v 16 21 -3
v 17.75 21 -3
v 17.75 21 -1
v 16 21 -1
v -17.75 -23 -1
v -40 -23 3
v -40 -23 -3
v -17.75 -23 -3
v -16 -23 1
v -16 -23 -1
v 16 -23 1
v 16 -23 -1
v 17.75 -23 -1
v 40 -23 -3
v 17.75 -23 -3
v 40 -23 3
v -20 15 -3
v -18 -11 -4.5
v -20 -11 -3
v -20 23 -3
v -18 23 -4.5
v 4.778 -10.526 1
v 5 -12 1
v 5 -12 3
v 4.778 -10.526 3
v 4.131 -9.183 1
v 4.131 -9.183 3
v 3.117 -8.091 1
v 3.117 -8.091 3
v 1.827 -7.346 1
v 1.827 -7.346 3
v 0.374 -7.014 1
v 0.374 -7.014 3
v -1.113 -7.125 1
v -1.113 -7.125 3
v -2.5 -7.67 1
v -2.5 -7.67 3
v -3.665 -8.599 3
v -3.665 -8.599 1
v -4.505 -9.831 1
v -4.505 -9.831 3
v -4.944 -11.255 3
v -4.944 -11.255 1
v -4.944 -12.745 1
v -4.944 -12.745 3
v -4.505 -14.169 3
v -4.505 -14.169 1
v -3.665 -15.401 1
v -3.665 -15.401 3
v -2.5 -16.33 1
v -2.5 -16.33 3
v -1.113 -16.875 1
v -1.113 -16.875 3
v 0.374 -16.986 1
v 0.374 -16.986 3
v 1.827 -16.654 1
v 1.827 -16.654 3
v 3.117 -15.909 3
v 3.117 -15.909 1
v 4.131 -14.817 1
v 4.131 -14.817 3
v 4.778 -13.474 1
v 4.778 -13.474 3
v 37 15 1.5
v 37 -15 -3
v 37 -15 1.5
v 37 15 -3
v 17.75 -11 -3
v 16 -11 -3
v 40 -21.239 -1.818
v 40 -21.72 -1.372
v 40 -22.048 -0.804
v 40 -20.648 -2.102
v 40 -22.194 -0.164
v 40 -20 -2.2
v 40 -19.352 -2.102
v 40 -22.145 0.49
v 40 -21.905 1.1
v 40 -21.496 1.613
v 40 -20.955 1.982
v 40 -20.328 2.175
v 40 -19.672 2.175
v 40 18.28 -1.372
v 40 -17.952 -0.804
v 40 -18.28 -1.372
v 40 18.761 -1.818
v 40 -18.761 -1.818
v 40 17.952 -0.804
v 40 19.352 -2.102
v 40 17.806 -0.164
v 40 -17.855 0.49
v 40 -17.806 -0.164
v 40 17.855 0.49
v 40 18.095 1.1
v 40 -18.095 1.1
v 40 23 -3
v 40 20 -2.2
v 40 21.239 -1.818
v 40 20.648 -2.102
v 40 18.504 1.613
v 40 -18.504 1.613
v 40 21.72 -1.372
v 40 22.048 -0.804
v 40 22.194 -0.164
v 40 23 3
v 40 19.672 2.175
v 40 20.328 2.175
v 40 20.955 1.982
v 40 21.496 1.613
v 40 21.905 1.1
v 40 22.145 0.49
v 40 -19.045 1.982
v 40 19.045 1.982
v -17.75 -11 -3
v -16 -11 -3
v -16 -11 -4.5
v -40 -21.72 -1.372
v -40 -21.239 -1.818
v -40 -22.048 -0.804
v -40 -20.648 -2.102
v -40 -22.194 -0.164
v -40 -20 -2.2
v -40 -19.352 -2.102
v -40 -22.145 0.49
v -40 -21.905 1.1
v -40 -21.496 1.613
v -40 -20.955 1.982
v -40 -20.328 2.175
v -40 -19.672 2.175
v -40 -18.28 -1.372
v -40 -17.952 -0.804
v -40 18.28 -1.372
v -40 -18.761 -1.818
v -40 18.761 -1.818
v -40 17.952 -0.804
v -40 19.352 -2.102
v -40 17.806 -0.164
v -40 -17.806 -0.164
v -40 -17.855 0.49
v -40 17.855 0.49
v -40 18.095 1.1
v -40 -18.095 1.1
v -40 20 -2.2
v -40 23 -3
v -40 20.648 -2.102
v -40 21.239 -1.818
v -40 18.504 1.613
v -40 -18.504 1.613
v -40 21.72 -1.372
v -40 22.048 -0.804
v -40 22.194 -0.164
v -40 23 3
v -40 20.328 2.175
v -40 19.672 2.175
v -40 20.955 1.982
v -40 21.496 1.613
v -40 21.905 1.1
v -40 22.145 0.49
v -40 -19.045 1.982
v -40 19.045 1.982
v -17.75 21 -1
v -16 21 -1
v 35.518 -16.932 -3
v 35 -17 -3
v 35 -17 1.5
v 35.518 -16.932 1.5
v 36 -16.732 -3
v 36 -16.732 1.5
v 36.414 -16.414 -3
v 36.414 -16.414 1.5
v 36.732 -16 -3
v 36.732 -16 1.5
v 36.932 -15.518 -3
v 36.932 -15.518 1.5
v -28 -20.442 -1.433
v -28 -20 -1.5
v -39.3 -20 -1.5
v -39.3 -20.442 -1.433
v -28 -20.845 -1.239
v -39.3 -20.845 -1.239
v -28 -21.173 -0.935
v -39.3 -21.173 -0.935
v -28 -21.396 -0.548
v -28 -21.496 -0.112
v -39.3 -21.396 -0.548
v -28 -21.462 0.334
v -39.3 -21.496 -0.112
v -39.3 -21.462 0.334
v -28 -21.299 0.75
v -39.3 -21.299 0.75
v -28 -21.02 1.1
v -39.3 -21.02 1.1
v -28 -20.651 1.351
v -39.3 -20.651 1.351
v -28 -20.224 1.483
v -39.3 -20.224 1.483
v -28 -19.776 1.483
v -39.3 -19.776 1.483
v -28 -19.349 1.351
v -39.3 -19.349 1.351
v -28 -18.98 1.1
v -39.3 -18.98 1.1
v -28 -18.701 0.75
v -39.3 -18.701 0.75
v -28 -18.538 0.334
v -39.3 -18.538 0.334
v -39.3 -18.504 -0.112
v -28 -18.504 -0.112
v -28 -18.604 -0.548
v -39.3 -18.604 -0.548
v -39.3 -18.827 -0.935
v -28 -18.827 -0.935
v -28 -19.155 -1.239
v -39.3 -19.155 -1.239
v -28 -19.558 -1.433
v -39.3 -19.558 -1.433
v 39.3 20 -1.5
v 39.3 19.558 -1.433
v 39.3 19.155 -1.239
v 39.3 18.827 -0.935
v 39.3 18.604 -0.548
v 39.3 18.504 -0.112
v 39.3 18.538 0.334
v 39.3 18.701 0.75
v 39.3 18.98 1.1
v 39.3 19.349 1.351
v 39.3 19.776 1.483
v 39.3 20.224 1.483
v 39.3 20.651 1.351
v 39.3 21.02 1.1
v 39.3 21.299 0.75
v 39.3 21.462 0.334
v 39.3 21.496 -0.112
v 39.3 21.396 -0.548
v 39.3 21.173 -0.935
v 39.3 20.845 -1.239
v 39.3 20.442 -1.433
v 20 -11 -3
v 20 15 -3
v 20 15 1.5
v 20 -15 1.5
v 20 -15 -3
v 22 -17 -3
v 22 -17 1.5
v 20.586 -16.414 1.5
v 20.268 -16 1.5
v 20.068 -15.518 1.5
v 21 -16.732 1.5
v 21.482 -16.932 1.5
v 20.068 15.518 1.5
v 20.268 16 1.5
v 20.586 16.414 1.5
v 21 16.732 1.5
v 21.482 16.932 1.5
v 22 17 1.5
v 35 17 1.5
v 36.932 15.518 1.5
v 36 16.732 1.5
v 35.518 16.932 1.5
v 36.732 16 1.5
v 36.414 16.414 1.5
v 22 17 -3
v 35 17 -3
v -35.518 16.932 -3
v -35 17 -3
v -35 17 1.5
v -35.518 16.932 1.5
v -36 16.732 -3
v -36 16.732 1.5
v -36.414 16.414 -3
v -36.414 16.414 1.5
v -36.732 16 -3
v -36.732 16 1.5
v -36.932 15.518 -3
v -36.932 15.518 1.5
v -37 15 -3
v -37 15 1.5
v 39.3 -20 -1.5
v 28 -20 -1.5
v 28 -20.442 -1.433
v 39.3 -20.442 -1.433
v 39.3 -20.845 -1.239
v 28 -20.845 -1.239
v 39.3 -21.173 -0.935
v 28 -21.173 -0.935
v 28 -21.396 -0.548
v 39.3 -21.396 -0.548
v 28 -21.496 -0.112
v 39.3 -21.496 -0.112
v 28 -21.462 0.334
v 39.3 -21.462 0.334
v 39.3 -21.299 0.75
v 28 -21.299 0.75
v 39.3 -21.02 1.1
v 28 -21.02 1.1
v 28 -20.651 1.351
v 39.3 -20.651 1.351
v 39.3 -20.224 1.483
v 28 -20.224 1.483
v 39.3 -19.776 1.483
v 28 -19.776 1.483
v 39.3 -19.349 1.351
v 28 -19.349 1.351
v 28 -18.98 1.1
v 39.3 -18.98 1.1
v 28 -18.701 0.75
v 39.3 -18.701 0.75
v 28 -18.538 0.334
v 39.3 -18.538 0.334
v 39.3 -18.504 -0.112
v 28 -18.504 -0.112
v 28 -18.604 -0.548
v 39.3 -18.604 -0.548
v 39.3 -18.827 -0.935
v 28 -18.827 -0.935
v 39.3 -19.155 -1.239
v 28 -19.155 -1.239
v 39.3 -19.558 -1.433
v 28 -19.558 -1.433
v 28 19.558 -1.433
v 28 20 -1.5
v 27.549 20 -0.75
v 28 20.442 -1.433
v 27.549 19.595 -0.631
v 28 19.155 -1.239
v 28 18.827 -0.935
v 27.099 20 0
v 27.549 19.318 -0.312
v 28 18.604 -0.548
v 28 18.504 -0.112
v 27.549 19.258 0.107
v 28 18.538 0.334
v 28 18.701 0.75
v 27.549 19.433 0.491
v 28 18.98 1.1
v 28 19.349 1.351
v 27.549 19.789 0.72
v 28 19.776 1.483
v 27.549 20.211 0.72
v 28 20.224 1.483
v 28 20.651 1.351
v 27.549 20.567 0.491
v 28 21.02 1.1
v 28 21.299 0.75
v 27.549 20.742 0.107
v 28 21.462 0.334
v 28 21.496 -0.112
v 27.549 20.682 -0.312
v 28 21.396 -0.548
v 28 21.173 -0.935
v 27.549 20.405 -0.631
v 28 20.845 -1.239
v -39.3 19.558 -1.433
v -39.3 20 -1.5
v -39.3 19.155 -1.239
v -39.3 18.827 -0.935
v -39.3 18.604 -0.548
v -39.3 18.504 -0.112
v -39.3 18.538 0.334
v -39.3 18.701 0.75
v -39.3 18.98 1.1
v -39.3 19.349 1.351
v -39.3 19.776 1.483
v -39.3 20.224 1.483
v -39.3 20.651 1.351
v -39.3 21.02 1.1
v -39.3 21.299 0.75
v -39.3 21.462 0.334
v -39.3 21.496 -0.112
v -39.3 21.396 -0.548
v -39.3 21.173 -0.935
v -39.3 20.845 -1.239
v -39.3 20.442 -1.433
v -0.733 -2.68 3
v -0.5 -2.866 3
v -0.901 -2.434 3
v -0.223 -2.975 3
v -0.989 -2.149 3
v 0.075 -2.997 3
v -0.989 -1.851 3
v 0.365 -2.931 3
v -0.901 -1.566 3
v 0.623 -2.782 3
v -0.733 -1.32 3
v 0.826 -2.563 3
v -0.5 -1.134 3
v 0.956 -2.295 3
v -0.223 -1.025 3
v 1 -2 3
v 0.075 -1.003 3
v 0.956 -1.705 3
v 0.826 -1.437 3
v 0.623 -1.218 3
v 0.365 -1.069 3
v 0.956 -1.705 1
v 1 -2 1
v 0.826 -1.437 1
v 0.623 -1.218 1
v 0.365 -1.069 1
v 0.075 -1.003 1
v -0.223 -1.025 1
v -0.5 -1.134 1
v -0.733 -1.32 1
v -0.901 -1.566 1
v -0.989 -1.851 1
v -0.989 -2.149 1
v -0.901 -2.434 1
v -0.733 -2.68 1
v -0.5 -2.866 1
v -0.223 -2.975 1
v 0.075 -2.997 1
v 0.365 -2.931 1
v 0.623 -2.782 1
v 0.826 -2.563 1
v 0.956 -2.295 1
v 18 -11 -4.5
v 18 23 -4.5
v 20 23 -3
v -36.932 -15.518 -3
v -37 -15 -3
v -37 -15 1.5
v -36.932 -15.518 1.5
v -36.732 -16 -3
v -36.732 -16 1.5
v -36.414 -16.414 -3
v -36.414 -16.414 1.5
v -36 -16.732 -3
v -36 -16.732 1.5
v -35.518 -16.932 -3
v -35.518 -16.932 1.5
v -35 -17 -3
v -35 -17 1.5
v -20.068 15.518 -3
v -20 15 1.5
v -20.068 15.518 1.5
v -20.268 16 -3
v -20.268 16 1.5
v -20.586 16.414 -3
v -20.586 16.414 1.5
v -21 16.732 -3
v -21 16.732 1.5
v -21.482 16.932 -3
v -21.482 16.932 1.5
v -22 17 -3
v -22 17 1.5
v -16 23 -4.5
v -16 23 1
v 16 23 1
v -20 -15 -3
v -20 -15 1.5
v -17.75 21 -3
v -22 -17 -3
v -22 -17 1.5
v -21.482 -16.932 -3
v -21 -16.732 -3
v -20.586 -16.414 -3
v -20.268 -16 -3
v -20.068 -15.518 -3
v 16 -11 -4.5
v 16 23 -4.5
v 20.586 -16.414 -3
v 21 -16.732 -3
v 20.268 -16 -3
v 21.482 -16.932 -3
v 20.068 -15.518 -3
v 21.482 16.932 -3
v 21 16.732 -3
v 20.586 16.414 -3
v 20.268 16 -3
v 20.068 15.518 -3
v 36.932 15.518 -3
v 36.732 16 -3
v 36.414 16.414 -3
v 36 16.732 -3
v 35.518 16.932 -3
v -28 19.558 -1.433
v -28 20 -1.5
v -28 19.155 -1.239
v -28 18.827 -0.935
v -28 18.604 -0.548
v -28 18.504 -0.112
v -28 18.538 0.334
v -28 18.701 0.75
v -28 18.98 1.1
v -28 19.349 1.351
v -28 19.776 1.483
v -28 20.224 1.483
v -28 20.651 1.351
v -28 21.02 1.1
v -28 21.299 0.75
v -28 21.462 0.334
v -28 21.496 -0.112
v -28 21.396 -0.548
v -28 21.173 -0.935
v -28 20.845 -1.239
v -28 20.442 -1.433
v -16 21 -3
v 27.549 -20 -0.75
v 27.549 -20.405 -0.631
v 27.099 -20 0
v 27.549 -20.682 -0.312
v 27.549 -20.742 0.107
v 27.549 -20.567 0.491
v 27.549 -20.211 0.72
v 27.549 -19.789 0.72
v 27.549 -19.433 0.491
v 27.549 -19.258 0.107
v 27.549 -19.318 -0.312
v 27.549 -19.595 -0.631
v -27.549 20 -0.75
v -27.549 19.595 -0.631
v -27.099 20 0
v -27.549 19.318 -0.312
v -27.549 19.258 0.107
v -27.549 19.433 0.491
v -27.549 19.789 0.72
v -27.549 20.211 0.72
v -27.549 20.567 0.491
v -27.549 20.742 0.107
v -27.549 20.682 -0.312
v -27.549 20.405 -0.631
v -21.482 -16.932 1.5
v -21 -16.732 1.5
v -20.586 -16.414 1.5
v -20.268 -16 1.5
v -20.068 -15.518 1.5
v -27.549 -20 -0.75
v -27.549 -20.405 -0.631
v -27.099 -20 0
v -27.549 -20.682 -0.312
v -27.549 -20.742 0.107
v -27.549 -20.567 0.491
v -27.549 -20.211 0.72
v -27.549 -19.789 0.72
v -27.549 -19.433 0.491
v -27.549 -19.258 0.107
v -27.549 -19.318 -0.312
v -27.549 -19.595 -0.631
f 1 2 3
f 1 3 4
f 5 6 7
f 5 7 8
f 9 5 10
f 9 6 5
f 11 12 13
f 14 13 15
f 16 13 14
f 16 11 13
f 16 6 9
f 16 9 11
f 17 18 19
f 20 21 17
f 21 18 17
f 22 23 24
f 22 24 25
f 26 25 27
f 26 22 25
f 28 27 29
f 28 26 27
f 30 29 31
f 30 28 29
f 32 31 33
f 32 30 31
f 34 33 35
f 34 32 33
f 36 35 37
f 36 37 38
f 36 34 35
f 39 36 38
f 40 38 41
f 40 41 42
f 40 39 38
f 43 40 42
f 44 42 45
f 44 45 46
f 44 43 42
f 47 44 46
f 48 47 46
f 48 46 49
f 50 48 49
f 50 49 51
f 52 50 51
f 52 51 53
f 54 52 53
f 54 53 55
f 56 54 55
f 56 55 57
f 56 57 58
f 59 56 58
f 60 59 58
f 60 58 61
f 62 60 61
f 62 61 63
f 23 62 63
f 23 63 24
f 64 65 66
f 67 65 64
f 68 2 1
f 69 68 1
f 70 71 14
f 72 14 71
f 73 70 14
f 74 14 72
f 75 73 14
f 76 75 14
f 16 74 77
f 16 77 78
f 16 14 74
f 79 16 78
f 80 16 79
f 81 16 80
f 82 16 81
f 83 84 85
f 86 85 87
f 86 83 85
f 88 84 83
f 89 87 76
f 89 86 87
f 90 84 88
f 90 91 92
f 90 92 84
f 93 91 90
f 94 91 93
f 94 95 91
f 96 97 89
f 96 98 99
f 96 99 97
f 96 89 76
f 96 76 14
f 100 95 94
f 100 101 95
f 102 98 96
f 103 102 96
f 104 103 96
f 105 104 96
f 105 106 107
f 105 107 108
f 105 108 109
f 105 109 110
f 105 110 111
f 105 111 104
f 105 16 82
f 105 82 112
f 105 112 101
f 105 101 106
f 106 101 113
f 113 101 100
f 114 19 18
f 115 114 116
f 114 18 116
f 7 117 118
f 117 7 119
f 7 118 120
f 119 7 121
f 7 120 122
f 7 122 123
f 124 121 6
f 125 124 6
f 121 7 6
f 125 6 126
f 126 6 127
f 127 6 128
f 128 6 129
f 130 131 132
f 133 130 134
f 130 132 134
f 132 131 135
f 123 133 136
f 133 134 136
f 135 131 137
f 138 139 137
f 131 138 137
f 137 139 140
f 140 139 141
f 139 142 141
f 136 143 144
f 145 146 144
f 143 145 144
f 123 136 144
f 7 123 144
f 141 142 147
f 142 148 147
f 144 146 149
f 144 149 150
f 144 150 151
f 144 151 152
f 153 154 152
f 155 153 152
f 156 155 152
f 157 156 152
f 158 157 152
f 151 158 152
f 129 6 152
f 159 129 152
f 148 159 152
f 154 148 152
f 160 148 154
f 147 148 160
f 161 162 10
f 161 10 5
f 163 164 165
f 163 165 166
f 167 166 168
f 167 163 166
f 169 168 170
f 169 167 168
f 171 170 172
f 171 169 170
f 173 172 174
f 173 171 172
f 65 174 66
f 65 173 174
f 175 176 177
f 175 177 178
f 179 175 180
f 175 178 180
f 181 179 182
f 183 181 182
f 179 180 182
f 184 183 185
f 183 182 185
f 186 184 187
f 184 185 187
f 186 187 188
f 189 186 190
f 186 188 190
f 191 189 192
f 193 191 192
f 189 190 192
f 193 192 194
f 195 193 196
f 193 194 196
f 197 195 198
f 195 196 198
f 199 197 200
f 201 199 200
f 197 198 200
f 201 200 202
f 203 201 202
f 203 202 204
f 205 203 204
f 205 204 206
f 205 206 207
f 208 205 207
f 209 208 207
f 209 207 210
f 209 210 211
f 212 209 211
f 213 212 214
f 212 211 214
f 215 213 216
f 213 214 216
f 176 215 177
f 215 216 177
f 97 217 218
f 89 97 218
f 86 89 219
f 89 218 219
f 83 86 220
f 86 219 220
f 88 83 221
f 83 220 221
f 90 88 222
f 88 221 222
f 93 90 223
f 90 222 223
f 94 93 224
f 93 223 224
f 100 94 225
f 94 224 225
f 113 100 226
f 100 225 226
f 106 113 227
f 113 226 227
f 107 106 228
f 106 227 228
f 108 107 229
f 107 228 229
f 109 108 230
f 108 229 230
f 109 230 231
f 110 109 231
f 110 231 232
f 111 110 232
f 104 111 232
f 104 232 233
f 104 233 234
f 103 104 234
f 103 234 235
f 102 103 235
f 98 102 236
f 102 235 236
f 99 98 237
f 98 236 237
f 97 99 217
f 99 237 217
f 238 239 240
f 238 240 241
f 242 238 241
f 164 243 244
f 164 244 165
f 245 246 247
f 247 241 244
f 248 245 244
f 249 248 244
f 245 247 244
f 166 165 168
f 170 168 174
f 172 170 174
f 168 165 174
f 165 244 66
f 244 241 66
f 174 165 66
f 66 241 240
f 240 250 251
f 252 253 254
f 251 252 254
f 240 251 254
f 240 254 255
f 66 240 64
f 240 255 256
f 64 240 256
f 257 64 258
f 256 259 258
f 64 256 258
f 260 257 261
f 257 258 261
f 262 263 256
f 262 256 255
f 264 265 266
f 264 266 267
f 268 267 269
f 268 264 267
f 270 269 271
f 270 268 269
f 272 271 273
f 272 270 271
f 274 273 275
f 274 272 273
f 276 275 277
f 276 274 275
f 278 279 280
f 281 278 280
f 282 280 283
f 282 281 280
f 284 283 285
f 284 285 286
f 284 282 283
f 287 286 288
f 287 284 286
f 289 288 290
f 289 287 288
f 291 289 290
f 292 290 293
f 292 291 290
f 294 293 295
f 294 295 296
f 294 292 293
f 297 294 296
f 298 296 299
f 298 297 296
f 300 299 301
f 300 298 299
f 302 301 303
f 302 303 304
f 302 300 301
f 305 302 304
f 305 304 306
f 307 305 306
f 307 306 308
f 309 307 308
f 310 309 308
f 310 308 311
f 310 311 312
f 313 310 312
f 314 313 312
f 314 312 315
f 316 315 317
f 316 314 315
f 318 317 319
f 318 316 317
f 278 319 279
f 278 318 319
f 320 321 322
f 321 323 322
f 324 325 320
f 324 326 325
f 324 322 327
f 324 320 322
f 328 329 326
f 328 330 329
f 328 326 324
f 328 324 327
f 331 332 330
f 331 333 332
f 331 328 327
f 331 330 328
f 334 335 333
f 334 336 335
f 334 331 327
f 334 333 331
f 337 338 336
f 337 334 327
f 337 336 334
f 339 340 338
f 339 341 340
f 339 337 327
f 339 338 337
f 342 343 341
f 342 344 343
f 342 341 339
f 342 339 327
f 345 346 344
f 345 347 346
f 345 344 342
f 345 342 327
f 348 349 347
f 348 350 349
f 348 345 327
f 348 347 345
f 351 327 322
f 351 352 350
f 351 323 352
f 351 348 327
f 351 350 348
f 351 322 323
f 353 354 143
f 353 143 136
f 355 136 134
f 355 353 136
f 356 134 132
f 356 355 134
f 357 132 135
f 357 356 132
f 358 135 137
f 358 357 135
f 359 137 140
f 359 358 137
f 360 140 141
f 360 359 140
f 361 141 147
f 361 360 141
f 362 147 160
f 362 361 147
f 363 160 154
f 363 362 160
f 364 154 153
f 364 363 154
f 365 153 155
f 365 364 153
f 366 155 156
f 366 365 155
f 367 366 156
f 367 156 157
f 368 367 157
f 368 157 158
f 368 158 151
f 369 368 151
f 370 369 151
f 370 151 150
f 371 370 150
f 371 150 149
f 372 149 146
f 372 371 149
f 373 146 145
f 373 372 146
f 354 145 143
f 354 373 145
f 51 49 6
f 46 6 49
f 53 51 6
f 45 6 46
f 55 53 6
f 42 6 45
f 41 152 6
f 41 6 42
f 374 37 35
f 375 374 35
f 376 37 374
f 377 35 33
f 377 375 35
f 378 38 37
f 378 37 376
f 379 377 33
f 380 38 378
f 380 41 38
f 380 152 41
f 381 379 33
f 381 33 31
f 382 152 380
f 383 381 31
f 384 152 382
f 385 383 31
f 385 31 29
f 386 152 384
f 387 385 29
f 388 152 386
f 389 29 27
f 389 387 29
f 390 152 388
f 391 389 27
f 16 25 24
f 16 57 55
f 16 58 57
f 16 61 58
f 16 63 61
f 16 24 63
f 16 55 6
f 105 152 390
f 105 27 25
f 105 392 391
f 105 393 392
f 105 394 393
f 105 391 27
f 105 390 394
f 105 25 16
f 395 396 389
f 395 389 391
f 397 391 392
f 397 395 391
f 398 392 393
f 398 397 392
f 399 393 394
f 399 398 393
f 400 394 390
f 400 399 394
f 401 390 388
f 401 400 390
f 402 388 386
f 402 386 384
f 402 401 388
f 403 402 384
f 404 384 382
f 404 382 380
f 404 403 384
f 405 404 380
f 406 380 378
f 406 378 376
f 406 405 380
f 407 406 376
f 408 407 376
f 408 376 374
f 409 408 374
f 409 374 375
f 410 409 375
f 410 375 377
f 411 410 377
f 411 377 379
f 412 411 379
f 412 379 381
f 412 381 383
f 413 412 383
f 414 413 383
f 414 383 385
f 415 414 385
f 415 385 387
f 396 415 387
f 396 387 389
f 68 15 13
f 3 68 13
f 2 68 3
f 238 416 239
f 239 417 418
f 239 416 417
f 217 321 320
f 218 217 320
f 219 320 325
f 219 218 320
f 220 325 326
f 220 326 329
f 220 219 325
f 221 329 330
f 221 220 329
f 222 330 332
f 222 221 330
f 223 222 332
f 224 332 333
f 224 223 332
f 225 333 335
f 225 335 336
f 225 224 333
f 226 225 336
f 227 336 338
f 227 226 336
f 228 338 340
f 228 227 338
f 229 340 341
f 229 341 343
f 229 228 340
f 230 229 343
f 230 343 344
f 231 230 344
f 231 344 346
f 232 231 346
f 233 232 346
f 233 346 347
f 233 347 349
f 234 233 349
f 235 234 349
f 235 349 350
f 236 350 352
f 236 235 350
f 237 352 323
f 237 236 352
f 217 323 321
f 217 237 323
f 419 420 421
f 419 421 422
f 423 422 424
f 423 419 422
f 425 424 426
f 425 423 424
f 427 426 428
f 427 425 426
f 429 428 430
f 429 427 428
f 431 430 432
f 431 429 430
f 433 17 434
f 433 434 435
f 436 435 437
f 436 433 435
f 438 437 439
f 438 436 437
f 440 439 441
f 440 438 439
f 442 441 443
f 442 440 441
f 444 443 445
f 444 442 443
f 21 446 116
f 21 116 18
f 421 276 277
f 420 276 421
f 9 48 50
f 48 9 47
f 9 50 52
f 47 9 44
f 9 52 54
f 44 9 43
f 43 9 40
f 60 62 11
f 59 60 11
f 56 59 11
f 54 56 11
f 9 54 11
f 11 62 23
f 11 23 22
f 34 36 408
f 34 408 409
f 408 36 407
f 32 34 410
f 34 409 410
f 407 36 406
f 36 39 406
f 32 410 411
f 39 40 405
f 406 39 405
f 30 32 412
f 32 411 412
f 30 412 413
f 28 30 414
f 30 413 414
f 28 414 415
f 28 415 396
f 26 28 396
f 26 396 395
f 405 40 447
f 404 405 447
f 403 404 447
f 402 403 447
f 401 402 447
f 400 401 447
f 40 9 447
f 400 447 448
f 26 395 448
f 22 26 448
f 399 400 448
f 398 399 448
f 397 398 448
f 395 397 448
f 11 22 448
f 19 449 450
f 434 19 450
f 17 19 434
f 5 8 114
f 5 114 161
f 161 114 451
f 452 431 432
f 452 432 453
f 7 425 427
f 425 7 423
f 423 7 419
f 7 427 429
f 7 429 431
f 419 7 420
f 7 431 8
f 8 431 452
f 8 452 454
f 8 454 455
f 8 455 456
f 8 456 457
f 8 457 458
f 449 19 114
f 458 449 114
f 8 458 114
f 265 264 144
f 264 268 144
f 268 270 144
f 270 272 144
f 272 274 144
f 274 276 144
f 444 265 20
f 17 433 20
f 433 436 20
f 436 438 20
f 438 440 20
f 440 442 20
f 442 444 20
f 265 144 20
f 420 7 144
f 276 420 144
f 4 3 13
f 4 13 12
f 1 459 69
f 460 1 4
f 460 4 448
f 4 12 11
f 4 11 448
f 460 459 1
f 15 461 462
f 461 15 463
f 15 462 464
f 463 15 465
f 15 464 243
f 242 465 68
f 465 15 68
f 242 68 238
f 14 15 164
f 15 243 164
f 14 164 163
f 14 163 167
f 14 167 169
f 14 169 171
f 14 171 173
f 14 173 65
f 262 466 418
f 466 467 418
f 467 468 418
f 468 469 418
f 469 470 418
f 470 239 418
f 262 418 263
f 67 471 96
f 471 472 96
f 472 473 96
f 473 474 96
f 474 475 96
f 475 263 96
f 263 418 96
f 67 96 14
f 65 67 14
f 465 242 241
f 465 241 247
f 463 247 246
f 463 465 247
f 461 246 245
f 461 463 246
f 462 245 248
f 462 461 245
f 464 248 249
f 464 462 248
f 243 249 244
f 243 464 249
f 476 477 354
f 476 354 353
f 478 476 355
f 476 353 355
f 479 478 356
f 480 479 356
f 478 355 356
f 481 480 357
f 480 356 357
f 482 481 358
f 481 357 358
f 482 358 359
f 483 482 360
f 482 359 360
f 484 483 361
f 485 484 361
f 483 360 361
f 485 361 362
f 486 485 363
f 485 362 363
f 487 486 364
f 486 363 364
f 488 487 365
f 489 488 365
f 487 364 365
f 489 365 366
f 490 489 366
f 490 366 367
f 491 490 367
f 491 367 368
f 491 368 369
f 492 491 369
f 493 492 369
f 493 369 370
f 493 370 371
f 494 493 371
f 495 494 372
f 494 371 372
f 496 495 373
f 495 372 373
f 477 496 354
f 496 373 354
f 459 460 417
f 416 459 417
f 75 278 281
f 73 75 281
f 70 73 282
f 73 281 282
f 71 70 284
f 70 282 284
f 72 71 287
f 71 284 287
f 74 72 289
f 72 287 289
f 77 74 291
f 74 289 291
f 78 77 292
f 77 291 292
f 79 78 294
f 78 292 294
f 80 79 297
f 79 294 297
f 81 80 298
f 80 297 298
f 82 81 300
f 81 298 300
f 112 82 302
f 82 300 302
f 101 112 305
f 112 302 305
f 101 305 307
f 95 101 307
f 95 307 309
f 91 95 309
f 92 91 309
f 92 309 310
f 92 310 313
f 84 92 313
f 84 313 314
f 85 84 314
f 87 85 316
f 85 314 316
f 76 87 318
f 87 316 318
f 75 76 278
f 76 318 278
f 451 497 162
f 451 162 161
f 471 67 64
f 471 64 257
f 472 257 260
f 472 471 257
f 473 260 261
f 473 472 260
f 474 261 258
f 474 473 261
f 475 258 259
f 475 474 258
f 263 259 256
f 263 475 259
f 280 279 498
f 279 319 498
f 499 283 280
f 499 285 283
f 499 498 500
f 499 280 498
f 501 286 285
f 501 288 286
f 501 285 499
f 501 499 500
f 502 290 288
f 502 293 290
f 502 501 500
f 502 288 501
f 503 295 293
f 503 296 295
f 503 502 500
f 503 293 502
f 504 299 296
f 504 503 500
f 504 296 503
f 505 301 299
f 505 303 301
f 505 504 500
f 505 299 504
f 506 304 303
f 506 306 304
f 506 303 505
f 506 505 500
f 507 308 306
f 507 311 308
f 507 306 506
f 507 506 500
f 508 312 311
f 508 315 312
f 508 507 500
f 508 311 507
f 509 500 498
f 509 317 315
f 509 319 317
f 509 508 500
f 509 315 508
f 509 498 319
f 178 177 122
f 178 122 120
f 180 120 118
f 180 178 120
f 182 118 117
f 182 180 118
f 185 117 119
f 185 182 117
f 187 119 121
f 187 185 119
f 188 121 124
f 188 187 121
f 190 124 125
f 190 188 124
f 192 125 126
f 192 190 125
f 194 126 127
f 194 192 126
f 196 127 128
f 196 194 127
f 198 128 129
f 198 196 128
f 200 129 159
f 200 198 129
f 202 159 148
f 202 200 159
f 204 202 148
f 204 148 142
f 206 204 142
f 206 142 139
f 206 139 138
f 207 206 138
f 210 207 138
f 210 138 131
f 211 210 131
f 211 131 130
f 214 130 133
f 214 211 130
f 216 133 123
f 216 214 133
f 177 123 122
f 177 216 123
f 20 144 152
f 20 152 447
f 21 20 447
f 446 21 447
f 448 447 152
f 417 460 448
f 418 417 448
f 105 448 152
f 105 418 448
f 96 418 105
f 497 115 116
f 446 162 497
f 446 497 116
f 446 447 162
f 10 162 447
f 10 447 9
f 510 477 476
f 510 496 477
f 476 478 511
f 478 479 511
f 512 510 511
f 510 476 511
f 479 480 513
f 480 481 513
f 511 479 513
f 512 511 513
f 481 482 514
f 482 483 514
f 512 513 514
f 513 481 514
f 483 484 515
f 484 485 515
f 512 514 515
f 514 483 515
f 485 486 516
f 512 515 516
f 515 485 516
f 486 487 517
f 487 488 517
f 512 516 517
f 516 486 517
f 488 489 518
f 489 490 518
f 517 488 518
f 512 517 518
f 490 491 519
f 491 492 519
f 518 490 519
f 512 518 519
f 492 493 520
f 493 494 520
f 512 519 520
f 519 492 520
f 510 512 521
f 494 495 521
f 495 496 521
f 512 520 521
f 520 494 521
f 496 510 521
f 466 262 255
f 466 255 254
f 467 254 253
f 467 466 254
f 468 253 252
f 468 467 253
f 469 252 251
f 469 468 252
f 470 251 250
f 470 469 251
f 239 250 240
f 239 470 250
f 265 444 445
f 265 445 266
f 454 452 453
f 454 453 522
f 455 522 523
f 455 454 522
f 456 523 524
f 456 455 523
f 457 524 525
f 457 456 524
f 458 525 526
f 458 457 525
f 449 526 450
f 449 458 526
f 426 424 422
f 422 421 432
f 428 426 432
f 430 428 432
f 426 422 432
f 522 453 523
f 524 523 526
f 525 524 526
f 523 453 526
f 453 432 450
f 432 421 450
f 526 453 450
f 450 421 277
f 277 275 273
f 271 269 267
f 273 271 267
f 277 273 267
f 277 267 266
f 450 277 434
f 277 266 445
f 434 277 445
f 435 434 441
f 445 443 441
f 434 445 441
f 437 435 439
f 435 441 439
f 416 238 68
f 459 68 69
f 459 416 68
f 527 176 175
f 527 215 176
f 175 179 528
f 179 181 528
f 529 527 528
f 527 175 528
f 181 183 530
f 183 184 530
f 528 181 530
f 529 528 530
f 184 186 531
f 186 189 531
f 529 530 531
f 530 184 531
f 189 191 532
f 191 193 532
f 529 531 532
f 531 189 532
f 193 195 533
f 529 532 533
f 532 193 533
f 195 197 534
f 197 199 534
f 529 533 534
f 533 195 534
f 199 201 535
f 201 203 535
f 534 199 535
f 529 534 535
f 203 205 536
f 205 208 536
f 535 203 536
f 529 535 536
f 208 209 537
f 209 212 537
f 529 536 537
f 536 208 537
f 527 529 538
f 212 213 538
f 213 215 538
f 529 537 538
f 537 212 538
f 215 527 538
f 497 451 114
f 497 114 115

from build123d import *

# Parameters (mm, degrees)
SKIZZE1_W                               = 80
SKIZZE1_H                               = 46
SKIZZE1_R                               = 5
SKIZZE1_R_2                             = 1
AUFSATZ_LINEAR_AUSTRAGEN1_DEPTH         = 3
AUFSATZ_LINEAR_AUSTRAGEN1_DEPTH_BACK    = 3
F_3_0_3_DURCHMESSER_BOHRUNG1_AT_2_COUNT = 2
F_3_0_3_DURCHMESSER_BOHRUNG1_AT_2_PITCH = 40
SKIZZE4_W                               = 32
SKIZZE4_H                               = 46
SCHNITT_LINEAR_AUSTRAGEN1_DEPTH         = 4
SCHNITT_LINEAR_AUSTRAGEN3_DEPTH         = 4.5
SKIZZE9_W                               = 35.5
SKIZZE9_H                               = 44
SCHNITT_LINEAR_AUSTRAGEN5_DEPTH         = 2
AUFSATZ_LINEAR_AUSTRAGEN2_DEPTH         = 34
FASE1_SIZE                              = 0.7


with BuildPart() as part:
    # Skizze1 → Aufsatz-Linear austragen1 (new body, two sides)
    with BuildSketch(Plane.XY) as aufsatz_linear_austragen1_sk:
        Rectangle(SKIZZE1_W, SKIZZE1_H)
        with Locations((0, -12)):
            Circle(SKIZZE1_R, mode=Mode.SUBTRACT)
        with Locations((0, -2)):
            Circle(SKIZZE1_R_2, mode=Mode.SUBTRACT)
    extrude(amount=AUFSATZ_LINEAR_AUSTRAGEN1_DEPTH)
    extrude(aufsatz_linear_austragen1_sk.sketch, amount=-AUFSATZ_LINEAR_AUSTRAGEN1_DEPTH_BACK)

    # Skizze2 → Ø3.0 (3) Durchmesser Bohrung1 (revolve, cut)
    with BuildSketch(Plane(origin=(40, -20, 0), x_dir=(0, 0, -1), z_dir=(0, 1, 0))):
        Polygon((0, 0), (0, 12.901290929), (1.5, 12), (1.5, 0), align=None)
    f_3_0_3_durchmesser_bohrung1 = revolve(axis=Axis((46.35, -20, 0), (-1, 0, 0)), mode=Mode.SUBTRACT)

    # Ø3.0 (3) Durchmesser Bohrung1 at 2: Ø3.0 (3) Durchmesser Bohrung1 ×2
    with Locations(*[(0, i * F_3_0_3_DURCHMESSER_BOHRUNG1_AT_2_PITCH, 0) for i in range(1, F_3_0_3_DURCHMESSER_BOHRUNG1_AT_2_COUNT)]):
        add(f_3_0_3_durchmesser_bohrung1, mode=Mode.SUBTRACT)

    # Spiegeln1: Ø3.0 (3) Durchmesser Bohrung1 across plane
    add(f_3_0_3_durchmesser_bohrung1.mirror(Plane(origin=(0, 0, 0), x_dir=(0, 0, 1), z_dir=(1, 0, 0))), mode=Mode.SUBTRACT)

    # Spiegeln1 copy 1 sketch → Spiegeln1 copy 1 (revolve, cut)
    with BuildSketch(Plane(origin=(-40, 20, 0), x_dir=(0, 0, -1), z_dir=(0, 1, 0))):
        Polygon((0, 0), (0, -12.901290929), (1.5, -12), (1.5, 0), align=None)
    revolve(axis=Axis((-46.35, 20, 0), (-1, 0, 0)), mode=Mode.SUBTRACT)

    # Skizze4 → Schnitt-Linear austragen1 (cut)
    with BuildSketch(Plane.XY.offset(-3)):
        Rectangle(SKIZZE4_W, SKIZZE4_H)
    extrude(amount=SCHNITT_LINEAR_AUSTRAGEN1_DEPTH, mode=Mode.SUBTRACT)

    # Skizze6 → Schnitt-Linear austragen3 (cut)
    with BuildSketch(Plane(origin=(0, 0, -3), x_dir=(-1, 0, 0), z_dir=(0, 0, -1))):
        with BuildLine():
            Line((37, 15), (37, -15))
            ThreePointArc((37, -15), (36.414213562, -16.414213562), (35, -17))
            Line((35, -17), (22, -17))
            ThreePointArc((22, -17), (20.585786438, -16.414213562), (20, -15))
            Line((20, -15), (20, 15))
            ThreePointArc((20, 15), (20.585786438, 16.414213562), (22, 17))
            Line((22, 17), (35, 17))
            ThreePointArc((35, 17), (36.414213562, 16.414213562), (37, 15))
        make_face()
        with BuildLine():
            Line((-35, 17), (-22, 17))
            ThreePointArc((-22, 17), (-20.585786438, 16.414213562), (-20, 15))
            Line((-20, 15), (-20, -15))
            ThreePointArc((-20, -15), (-20.585786438, -16.414213562), (-22, -17))
            Line((-22, -17), (-35, -17))
            ThreePointArc((-35, -17), (-36.414213562, -16.414213562), (-37, -15))
            Line((-37, -15), (-37, 15))
            ThreePointArc((-37, 15), (-36.414213562, 16.414213562), (-35, 17))
        make_face()
    extrude(amount=-SCHNITT_LINEAR_AUSTRAGEN3_DEPTH, mode=Mode.SUBTRACT)

    # Skizze9 → Schnitt-Linear austragen5 (cut)
    with BuildSketch(Plane(origin=(0, 0, -3), x_dir=(-1, 0, 0), z_dir=(0, 0, -1))):
        with Locations((0, -1)):
            Rectangle(SKIZZE9_W, SKIZZE9_H)
    extrude(amount=-SCHNITT_LINEAR_AUSTRAGEN5_DEPTH, mode=Mode.SUBTRACT)

    # Skizze10 → Aufsatz-Linear austragen2 (add)
    with BuildSketch(Plane(origin=(0, 23, 0), x_dir=(1, 0, 0), z_dir=(0, 1, 0))):
        Polygon((-16, 3), (-16, 4.5), (-18, 4.5), (-20, 3), align=None)
        Polygon((20, 3), (16, 3), (16, 4.5), (18, 4.5), align=None)
    extrude(amount=-AUFSATZ_LINEAR_AUSTRAGEN2_DEPTH)

    # Fase1
    fase1_edges = [part.edges().sort_by_distance(p)[0] for p in [
        (40, 20, 1.5),
        (40, -20, 1.5),
        (-40, 20, 1.5),
        (-40, -20, 1.5),
    ]]
    chamfer(fase1_edges, length=FASE1_SIZE)


solid = part.part
